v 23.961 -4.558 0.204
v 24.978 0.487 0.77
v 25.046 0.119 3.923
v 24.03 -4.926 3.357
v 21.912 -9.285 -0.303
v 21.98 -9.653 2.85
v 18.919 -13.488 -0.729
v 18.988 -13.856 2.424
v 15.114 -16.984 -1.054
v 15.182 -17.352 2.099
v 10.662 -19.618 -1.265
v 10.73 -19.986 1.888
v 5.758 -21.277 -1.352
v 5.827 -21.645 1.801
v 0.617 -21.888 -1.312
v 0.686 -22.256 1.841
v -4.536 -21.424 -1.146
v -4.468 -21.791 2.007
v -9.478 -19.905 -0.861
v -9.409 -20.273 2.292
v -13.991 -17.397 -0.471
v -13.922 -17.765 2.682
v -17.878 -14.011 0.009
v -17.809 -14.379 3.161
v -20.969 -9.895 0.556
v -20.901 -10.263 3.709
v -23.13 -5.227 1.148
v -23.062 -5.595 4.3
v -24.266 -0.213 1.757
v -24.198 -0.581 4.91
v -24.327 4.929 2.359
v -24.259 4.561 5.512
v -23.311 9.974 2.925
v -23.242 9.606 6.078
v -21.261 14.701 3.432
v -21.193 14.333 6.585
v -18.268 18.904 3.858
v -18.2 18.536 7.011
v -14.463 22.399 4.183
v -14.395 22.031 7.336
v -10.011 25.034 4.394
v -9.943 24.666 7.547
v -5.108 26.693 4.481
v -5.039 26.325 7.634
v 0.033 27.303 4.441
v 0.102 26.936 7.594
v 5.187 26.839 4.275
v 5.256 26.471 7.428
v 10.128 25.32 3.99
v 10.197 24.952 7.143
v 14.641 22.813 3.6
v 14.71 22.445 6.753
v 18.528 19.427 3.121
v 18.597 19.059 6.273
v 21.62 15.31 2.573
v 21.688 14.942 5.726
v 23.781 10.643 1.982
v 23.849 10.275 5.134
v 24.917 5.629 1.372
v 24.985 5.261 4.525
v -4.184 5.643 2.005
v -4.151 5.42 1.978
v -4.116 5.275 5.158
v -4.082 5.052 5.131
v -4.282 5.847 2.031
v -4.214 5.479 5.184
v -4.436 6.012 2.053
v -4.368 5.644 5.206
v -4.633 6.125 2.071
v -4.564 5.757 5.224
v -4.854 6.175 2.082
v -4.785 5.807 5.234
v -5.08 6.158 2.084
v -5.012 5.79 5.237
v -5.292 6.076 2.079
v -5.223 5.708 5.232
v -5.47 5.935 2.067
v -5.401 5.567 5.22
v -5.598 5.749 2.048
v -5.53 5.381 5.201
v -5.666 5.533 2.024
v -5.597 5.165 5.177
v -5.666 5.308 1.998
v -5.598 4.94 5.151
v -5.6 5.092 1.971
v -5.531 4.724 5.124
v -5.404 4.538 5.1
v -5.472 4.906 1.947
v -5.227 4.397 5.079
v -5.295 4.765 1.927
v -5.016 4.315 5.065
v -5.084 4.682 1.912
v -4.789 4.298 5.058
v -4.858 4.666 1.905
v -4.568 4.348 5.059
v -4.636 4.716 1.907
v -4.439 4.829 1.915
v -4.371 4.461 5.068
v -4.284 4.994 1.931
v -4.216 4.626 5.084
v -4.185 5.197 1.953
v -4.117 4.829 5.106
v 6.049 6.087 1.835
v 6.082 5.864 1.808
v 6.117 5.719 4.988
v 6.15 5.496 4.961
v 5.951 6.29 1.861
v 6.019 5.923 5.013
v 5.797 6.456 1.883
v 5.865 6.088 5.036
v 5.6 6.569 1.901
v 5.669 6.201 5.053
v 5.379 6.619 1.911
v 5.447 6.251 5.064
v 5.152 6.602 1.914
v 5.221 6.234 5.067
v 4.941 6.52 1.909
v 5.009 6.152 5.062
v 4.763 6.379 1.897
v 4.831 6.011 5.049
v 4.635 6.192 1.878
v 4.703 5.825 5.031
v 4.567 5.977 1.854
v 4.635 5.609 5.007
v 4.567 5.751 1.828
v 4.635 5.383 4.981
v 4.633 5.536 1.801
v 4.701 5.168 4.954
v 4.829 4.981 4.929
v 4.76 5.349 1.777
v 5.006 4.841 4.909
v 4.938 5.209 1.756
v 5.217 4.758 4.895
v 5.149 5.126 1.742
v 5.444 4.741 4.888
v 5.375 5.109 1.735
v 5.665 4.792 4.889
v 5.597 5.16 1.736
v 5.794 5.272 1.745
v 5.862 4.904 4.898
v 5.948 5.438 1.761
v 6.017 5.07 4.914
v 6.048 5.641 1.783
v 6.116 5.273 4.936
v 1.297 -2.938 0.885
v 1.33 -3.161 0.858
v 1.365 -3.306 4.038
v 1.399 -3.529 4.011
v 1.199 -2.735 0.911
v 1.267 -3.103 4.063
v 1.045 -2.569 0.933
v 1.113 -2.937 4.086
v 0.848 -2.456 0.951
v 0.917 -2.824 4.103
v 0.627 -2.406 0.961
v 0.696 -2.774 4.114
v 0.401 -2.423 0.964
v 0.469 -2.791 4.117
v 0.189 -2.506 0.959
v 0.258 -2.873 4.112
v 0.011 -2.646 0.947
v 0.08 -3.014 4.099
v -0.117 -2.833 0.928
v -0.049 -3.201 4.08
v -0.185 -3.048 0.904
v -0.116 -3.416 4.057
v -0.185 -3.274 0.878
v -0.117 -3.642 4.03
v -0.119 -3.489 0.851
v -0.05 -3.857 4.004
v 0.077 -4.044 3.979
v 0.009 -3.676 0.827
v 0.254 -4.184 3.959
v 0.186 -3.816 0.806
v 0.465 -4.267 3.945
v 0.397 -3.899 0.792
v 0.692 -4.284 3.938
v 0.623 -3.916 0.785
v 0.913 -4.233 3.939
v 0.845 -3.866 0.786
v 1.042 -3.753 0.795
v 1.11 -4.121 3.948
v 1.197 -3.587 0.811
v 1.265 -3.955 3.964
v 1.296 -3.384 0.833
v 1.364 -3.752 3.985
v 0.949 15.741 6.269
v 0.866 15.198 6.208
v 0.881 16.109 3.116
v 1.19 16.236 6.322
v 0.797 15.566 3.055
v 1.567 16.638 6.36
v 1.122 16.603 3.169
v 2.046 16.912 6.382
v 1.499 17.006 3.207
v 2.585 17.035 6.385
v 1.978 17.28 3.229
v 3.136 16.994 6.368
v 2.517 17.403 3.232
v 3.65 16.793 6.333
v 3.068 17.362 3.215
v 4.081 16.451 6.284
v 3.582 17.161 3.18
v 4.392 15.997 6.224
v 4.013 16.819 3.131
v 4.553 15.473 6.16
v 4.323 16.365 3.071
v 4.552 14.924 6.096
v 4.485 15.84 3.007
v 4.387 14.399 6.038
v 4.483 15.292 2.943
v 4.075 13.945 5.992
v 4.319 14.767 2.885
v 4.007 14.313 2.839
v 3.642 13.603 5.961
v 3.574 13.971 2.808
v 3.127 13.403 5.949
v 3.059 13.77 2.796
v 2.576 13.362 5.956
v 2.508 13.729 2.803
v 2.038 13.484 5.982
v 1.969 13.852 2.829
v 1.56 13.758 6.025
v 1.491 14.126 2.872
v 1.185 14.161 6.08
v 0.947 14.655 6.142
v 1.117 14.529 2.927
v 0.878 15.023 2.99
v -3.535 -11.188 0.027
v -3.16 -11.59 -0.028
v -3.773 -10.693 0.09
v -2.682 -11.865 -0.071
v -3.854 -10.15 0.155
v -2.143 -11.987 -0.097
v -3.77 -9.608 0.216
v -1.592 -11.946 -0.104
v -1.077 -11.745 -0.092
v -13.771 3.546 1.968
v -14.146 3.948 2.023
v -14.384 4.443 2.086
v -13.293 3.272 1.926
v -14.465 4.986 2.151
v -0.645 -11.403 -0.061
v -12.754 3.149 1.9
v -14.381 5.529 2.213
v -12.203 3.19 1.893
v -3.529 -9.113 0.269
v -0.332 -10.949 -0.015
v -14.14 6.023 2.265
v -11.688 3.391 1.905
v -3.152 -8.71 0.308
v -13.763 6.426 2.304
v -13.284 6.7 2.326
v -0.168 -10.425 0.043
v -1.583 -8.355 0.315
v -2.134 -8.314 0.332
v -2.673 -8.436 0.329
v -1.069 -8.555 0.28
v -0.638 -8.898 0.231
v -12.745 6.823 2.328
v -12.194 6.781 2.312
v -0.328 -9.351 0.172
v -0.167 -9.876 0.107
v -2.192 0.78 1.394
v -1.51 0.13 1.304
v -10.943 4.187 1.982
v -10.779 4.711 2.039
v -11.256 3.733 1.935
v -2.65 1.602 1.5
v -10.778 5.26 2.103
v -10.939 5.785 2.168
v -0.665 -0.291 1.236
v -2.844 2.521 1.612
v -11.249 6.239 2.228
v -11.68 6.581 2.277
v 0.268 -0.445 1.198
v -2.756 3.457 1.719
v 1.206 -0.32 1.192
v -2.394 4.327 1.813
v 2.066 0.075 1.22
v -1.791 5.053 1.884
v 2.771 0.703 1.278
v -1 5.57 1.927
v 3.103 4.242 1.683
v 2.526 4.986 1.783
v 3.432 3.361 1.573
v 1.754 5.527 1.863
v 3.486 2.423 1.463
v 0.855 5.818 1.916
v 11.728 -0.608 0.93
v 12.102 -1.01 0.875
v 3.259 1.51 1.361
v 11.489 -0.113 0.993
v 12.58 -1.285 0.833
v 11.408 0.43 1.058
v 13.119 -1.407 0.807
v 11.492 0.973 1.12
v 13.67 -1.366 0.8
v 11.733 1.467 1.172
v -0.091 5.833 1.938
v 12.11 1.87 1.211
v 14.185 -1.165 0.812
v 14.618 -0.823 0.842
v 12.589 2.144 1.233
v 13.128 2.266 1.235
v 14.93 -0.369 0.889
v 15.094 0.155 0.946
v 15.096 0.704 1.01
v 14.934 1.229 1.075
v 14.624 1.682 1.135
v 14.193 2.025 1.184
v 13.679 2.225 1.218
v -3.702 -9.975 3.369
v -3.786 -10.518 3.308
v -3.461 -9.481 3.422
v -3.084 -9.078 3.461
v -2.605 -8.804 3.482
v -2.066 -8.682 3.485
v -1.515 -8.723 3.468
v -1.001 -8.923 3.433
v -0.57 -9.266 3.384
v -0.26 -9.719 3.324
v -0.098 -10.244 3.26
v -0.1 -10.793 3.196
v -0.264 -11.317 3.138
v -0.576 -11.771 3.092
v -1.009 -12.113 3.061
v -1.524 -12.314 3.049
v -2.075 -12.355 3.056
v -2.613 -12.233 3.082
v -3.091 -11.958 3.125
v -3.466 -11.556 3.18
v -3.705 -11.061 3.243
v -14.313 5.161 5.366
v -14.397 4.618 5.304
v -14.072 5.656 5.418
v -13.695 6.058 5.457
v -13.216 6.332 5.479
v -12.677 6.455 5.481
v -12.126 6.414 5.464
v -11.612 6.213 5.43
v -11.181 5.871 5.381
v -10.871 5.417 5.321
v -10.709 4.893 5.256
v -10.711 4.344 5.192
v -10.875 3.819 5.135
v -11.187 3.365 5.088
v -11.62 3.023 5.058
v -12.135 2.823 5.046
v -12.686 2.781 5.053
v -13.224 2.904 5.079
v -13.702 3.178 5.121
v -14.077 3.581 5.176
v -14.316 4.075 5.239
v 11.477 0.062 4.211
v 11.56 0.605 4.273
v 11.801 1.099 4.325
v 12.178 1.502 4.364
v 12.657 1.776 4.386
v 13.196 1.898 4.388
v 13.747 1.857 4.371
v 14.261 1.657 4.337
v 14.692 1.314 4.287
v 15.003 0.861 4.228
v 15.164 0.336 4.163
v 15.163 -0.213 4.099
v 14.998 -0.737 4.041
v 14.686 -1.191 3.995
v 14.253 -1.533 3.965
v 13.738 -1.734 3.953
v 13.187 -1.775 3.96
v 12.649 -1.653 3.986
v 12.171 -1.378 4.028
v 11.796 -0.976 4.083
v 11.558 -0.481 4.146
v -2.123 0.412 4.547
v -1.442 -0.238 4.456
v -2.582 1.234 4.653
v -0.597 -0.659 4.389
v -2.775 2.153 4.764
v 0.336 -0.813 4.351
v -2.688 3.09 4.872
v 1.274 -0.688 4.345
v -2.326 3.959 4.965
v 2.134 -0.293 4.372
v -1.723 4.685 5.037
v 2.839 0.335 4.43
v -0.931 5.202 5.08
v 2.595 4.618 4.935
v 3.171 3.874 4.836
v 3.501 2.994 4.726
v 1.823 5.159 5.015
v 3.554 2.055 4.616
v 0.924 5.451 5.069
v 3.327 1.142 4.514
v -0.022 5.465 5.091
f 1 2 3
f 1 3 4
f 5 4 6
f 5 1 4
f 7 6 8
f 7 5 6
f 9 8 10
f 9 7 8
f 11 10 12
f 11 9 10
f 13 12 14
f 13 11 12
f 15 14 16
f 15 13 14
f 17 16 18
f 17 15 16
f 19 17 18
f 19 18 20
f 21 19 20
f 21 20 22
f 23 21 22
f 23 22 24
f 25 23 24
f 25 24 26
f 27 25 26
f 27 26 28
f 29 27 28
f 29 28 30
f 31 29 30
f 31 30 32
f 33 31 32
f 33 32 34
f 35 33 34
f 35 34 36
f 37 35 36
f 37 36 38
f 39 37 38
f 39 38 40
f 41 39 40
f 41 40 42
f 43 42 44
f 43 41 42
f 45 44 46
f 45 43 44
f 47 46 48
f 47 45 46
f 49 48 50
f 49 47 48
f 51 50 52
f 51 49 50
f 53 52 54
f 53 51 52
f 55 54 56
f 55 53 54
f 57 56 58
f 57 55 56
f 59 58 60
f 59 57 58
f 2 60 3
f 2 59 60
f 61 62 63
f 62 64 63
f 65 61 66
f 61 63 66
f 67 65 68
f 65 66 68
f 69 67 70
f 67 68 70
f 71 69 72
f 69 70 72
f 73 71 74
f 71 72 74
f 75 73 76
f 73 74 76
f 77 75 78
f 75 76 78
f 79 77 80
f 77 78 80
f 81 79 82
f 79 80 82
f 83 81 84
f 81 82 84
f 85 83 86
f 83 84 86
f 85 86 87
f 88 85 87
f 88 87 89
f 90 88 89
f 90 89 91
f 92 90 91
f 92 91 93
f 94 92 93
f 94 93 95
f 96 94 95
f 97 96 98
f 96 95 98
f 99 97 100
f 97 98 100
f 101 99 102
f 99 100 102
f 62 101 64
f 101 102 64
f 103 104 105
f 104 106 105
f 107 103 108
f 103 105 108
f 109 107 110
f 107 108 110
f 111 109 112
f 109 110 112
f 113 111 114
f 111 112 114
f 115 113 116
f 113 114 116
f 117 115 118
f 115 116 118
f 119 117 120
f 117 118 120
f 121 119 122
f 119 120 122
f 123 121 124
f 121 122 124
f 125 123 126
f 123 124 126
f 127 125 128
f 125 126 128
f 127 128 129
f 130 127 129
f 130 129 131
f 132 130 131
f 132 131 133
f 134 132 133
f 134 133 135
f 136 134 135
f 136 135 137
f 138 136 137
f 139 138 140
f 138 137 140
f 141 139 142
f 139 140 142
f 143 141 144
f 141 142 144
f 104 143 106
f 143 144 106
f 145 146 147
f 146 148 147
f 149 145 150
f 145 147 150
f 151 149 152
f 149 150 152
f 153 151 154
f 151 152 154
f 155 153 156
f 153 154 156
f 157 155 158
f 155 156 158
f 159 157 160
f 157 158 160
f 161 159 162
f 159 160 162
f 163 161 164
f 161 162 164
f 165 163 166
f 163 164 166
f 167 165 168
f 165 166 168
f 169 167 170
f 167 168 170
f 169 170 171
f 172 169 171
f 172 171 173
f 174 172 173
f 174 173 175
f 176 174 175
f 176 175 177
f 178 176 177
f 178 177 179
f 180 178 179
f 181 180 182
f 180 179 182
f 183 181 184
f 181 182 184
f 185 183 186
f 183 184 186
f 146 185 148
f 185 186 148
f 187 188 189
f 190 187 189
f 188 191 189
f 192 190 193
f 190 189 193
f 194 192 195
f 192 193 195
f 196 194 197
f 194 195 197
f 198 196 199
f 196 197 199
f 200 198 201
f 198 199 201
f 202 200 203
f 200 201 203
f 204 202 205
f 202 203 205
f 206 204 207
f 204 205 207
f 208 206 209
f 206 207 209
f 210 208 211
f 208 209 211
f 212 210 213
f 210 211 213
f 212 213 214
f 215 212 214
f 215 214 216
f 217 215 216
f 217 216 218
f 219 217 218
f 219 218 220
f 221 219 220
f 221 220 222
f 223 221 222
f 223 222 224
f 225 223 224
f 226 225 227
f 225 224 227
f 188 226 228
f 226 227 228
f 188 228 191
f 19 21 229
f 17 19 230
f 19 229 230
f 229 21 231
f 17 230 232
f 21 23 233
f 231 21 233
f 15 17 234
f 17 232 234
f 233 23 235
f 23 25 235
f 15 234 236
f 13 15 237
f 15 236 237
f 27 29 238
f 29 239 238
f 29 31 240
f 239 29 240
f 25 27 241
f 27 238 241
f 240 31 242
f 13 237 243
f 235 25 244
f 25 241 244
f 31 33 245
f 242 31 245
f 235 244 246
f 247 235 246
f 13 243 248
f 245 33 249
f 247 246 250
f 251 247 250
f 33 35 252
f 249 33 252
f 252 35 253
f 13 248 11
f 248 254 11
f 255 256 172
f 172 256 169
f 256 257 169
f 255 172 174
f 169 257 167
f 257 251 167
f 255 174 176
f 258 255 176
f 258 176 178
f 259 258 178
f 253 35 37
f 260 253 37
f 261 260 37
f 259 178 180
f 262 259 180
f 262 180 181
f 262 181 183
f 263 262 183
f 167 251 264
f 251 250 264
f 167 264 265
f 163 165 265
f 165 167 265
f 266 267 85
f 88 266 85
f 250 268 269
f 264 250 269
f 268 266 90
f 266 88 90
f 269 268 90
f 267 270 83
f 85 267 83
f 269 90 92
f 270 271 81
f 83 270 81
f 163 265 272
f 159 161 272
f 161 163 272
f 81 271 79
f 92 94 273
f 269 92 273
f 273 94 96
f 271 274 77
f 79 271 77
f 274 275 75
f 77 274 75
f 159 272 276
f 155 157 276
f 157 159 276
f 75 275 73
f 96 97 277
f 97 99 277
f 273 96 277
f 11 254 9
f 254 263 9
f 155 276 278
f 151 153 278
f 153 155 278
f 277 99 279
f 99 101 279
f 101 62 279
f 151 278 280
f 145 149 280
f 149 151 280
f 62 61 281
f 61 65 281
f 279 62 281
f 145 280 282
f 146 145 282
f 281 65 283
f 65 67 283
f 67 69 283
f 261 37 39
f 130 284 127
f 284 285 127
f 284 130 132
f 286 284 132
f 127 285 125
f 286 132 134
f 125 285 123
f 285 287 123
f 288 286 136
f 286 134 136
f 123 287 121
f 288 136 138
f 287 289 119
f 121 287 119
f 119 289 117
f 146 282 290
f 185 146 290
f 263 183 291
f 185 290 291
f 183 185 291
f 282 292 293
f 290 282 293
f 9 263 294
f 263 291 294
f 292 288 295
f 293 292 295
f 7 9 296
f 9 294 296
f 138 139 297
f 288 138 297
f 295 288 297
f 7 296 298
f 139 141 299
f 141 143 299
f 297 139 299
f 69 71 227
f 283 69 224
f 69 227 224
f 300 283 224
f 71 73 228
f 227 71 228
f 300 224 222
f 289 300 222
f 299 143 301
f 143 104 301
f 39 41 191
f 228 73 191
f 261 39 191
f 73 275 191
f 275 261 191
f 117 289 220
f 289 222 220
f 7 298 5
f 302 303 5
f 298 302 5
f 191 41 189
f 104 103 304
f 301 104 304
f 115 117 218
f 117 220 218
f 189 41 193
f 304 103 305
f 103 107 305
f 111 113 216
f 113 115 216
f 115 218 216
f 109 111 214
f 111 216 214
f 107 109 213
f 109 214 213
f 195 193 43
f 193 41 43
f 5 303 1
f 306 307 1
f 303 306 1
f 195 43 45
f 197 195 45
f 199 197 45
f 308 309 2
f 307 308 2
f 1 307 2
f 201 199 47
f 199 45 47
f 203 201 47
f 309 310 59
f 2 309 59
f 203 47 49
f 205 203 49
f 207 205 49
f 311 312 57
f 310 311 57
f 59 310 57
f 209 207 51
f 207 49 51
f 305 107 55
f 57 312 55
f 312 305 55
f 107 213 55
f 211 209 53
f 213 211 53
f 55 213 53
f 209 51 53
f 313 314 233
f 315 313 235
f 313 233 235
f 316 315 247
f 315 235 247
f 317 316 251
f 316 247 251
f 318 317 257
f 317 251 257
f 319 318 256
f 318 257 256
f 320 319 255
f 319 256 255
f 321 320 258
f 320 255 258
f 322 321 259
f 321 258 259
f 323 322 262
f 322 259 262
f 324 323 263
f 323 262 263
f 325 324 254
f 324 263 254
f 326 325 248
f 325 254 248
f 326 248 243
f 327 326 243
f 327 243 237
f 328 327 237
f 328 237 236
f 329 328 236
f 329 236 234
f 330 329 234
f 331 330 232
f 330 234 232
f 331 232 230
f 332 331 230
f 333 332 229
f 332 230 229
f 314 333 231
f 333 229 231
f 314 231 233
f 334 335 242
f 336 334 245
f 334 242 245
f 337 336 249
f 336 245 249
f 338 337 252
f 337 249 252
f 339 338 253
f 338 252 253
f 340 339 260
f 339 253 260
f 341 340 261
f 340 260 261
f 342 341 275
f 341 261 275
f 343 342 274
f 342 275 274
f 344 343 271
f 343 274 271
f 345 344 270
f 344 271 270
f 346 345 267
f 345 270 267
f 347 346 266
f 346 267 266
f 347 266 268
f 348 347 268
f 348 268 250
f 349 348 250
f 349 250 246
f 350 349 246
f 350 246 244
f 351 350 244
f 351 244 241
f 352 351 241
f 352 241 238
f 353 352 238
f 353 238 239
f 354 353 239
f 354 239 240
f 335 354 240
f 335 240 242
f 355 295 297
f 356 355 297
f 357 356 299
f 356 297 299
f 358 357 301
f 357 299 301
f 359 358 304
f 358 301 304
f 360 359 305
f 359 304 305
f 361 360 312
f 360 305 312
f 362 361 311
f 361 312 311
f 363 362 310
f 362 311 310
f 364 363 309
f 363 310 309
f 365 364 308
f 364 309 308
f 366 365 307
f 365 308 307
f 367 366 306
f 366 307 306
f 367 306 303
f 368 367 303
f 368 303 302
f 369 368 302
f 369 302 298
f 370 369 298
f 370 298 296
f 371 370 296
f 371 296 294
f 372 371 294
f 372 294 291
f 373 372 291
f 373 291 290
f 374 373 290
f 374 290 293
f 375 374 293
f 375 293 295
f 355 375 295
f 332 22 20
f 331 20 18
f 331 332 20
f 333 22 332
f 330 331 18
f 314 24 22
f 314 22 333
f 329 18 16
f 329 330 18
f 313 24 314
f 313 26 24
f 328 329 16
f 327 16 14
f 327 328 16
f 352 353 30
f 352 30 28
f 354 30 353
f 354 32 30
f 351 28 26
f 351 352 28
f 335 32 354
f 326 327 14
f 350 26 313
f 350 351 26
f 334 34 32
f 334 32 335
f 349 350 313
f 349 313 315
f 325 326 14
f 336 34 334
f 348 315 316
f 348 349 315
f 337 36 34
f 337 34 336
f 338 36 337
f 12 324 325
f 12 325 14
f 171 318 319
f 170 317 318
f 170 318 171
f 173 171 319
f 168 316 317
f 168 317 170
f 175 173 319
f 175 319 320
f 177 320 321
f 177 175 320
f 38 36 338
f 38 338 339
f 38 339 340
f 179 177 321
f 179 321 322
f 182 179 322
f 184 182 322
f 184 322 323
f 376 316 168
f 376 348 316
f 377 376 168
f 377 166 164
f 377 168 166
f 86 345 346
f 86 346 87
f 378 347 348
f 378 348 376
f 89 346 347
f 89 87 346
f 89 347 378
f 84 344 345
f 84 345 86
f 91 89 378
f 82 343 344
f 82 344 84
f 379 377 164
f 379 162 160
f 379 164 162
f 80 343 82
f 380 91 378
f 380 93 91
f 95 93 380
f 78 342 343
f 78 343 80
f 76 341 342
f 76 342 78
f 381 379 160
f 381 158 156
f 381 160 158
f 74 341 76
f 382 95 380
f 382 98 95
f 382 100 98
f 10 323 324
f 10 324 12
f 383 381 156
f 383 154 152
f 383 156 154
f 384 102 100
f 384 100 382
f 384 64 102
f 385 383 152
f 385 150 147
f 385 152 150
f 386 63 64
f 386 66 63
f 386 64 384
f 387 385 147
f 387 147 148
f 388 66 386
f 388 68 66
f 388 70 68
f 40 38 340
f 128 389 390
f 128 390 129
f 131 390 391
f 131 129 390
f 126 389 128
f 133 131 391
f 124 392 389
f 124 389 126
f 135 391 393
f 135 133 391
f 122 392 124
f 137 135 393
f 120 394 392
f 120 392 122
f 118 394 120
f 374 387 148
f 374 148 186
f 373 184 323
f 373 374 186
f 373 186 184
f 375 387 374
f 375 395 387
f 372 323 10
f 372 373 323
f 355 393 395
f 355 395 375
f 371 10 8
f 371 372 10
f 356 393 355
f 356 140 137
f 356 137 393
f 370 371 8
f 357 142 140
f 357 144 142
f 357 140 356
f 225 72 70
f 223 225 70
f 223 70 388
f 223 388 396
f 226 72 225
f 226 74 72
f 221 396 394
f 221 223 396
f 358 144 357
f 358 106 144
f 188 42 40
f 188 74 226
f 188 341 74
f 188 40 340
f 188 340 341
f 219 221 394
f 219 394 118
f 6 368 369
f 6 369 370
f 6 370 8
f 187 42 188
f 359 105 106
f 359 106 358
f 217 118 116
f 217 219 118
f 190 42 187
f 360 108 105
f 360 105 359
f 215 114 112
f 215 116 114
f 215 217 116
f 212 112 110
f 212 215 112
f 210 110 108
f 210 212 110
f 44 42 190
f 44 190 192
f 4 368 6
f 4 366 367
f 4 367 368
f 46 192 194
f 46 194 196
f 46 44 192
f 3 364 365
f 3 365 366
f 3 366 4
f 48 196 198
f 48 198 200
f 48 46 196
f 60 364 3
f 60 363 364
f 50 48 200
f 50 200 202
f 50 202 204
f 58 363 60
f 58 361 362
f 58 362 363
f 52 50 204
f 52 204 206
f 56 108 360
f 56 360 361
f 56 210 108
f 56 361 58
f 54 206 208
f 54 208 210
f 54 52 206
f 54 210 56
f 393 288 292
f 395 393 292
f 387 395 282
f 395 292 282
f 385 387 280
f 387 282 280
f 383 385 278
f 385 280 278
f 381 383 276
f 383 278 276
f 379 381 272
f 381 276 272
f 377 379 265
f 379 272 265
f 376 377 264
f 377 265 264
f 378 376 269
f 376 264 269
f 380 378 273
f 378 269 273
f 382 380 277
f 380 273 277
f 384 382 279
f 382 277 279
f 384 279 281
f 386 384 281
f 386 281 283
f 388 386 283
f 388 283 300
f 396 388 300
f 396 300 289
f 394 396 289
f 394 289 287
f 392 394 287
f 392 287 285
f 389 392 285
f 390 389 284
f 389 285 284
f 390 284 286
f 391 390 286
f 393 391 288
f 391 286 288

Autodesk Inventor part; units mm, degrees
ref_plane "YZ Plane" through (0, 0, 0) normal (1, 0, 0) x (0, 1, 0)
ref_plane "XZ Plane" through (0, 0, 0) normal (0, 1, 0) x (-1, 0, 0)
ref_plane "Work Plane1" through (-85.339, 6.6926, 3.8884) normal (0.0215481, -0.1158759, 0.9930299) x (0.9954541, -0.0896829, -0.0320657)
sketch "Sketch1" plane through (-85.339, 6.6926, 3.8884) normal (0.0215481, -0.1158759, 0.9930299) x (0.9954541, -0.0896829, -0.0320657)
  circle A0 centre (85.7068, 3.742) radius 3.175 projected
  circle A1 centre (85.7068, 3.742) radius 24.765
  point P0 (85.676, 0.8558)
  dimension "d0" = 49.53
extrude "Extrusion1" add sketch "Sketch1" along normal blind 3.175
sketch "Sketch2" plane through (0.3253, 2.7078, 1.5645) normal (-0.0215481, 0.1158759, -0.9930299) x (-0.9997647, 0, 0.0216942)
  circle A0 centre (12.9454, 2.2936) radius 1.8542
  circle A1 centre (-2.2936, 12.9454) radius 1.8542
  circle A2 centre (-12.9454, -2.2936) radius 1.8542
  circle A3 centre (2.2936, -12.9454) radius 1.8542
extrude "Extrusion2" cut sketch "Sketch2" against normal through all
sketch "Sketch3" plane through (0.3937, 2.3399, 4.7174) normal (0.0215481, -0.1158759, 0.9930299) x (0.9997647, 0, -0.0216942)
  circle A0 centre (-5.246, 2.7309) radius 0.762 projected
  circle A1 centre (4.988, 3.1777) radius 0.762 projected
  circle A2 centre (0.258, -5.9086) radius 0.762 projected
extrude "Extrusion3" cut sketch "Sketch3" against normal through all
properties part number "gearSpacerDisc01"
